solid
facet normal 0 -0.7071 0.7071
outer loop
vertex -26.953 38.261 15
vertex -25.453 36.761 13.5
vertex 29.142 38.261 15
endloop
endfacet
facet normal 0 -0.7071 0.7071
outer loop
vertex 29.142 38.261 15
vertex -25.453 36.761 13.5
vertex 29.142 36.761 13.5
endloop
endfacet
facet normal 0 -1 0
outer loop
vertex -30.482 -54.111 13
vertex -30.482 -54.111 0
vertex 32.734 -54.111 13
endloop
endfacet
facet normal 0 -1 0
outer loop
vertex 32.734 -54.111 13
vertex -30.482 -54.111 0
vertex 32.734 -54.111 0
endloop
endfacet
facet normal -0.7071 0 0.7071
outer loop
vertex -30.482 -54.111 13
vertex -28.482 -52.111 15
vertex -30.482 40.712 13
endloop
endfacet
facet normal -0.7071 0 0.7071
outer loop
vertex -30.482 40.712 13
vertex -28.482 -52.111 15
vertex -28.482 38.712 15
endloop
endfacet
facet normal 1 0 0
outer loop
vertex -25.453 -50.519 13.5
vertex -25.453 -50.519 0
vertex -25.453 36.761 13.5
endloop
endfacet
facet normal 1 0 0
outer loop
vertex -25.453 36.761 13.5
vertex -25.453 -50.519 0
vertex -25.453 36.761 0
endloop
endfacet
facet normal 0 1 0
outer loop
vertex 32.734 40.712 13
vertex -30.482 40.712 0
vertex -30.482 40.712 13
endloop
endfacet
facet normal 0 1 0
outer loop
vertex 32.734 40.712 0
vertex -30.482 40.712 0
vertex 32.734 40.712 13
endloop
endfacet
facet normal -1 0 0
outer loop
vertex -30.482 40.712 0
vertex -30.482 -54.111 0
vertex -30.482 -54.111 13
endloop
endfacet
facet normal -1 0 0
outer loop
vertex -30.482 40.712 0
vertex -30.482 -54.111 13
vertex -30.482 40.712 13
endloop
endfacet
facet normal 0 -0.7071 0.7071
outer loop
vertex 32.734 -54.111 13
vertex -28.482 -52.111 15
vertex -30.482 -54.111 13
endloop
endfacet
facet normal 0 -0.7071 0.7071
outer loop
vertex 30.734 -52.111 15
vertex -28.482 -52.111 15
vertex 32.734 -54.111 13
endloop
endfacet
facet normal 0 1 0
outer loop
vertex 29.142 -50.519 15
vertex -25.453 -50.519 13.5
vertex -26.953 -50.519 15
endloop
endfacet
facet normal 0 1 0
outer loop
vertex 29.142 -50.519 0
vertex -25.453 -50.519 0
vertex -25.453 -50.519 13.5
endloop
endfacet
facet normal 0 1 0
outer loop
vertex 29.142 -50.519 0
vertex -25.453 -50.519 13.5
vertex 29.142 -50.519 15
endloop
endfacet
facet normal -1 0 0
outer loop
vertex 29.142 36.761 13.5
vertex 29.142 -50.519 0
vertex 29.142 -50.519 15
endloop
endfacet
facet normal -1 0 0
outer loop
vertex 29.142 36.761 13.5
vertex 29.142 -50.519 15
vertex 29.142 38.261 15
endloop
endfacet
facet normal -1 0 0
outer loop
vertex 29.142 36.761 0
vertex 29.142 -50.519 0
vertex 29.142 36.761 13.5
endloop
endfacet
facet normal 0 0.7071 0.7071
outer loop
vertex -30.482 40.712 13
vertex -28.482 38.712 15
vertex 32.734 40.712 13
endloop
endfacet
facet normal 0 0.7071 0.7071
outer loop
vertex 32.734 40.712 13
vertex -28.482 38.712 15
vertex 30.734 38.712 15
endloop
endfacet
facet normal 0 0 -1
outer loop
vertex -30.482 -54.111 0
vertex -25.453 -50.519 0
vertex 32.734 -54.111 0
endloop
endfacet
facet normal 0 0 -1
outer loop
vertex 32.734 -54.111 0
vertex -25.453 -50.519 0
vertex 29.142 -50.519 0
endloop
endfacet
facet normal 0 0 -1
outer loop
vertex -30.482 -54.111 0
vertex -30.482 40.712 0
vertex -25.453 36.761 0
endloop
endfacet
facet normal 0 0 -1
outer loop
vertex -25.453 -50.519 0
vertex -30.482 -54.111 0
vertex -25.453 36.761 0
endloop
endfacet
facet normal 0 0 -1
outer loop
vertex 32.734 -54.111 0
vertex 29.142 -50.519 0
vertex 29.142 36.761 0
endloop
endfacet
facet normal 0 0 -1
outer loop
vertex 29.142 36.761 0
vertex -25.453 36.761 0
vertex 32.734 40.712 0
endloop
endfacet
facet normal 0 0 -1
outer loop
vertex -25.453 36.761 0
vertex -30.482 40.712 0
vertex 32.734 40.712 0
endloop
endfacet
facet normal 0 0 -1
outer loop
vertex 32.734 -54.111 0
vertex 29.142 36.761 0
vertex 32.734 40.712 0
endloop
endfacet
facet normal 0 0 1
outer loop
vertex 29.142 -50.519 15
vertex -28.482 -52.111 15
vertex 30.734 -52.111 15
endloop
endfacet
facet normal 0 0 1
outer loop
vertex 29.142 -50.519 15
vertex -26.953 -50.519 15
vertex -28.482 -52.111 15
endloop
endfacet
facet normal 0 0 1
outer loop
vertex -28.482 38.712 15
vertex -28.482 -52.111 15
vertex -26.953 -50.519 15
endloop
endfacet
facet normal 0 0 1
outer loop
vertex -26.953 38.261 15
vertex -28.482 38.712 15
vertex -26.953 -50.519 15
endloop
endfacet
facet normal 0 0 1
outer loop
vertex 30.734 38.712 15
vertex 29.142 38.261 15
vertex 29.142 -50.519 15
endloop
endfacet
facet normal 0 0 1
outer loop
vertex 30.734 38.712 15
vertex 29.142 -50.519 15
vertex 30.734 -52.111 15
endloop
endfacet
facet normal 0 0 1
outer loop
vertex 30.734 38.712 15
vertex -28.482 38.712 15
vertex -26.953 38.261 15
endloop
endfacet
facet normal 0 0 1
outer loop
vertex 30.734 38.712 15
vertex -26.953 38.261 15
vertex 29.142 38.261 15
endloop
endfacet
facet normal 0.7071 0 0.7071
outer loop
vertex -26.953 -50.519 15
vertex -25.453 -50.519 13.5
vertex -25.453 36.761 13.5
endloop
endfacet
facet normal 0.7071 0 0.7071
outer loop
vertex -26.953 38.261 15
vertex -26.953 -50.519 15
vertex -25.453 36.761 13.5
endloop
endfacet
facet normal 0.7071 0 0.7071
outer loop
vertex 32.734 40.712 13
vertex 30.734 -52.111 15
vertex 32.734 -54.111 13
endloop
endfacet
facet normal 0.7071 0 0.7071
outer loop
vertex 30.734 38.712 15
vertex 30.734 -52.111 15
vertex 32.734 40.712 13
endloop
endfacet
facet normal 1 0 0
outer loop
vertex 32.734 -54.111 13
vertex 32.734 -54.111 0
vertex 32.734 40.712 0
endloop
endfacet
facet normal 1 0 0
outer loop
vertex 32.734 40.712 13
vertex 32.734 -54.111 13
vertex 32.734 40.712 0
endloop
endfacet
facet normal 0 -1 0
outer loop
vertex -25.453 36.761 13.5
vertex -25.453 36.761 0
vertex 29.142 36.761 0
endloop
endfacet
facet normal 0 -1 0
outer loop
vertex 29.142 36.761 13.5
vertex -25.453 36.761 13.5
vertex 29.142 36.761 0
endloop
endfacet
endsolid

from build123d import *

# Parameters (mm, degrees)
F0_W     = 63.215511
F0_H     = 94.823267
F0_W_2   = 54.595215
F0_H_2   = 87.280504
F1_DEPTH = 15
F2_SIZE  = 2
F3_SIZE  = 1.5


with BuildPart() as f1:
    # F0 (on Top) → F1 (new body)
    with BuildSketch(Plane.XY):
        with Locations((1.126006, -6.699628)):
            Rectangle(F0_W, F0_H)
        with Locations((1.844364, -6.879218)):
            Rectangle(F0_W_2, F0_H_2, mode=Mode.SUBTRACT)
    extrude(amount=F1_DEPTH)

    # F2
    f2_edges = [f1.edges().sort_by_distance(p)[0] for p in [
        (-30.48175, -6.699627, 15),
        (1.126005, 40.712006, 15),
        (32.733761, -6.699627, 15),
        (1.126005, -54.111261, 15),
    ]]
    chamfer(f2_edges, length=F2_SIZE)

    # F3
    f3_edges = [f1.edges().sort_by_distance(p)[0] for p in [
        (1.844364, 36.761034, 15),
        (-25.453243, -6.879218, 15),
    ]]
    chamfer(f3_edges, length=F3_SIZE)


solid = f1.part
